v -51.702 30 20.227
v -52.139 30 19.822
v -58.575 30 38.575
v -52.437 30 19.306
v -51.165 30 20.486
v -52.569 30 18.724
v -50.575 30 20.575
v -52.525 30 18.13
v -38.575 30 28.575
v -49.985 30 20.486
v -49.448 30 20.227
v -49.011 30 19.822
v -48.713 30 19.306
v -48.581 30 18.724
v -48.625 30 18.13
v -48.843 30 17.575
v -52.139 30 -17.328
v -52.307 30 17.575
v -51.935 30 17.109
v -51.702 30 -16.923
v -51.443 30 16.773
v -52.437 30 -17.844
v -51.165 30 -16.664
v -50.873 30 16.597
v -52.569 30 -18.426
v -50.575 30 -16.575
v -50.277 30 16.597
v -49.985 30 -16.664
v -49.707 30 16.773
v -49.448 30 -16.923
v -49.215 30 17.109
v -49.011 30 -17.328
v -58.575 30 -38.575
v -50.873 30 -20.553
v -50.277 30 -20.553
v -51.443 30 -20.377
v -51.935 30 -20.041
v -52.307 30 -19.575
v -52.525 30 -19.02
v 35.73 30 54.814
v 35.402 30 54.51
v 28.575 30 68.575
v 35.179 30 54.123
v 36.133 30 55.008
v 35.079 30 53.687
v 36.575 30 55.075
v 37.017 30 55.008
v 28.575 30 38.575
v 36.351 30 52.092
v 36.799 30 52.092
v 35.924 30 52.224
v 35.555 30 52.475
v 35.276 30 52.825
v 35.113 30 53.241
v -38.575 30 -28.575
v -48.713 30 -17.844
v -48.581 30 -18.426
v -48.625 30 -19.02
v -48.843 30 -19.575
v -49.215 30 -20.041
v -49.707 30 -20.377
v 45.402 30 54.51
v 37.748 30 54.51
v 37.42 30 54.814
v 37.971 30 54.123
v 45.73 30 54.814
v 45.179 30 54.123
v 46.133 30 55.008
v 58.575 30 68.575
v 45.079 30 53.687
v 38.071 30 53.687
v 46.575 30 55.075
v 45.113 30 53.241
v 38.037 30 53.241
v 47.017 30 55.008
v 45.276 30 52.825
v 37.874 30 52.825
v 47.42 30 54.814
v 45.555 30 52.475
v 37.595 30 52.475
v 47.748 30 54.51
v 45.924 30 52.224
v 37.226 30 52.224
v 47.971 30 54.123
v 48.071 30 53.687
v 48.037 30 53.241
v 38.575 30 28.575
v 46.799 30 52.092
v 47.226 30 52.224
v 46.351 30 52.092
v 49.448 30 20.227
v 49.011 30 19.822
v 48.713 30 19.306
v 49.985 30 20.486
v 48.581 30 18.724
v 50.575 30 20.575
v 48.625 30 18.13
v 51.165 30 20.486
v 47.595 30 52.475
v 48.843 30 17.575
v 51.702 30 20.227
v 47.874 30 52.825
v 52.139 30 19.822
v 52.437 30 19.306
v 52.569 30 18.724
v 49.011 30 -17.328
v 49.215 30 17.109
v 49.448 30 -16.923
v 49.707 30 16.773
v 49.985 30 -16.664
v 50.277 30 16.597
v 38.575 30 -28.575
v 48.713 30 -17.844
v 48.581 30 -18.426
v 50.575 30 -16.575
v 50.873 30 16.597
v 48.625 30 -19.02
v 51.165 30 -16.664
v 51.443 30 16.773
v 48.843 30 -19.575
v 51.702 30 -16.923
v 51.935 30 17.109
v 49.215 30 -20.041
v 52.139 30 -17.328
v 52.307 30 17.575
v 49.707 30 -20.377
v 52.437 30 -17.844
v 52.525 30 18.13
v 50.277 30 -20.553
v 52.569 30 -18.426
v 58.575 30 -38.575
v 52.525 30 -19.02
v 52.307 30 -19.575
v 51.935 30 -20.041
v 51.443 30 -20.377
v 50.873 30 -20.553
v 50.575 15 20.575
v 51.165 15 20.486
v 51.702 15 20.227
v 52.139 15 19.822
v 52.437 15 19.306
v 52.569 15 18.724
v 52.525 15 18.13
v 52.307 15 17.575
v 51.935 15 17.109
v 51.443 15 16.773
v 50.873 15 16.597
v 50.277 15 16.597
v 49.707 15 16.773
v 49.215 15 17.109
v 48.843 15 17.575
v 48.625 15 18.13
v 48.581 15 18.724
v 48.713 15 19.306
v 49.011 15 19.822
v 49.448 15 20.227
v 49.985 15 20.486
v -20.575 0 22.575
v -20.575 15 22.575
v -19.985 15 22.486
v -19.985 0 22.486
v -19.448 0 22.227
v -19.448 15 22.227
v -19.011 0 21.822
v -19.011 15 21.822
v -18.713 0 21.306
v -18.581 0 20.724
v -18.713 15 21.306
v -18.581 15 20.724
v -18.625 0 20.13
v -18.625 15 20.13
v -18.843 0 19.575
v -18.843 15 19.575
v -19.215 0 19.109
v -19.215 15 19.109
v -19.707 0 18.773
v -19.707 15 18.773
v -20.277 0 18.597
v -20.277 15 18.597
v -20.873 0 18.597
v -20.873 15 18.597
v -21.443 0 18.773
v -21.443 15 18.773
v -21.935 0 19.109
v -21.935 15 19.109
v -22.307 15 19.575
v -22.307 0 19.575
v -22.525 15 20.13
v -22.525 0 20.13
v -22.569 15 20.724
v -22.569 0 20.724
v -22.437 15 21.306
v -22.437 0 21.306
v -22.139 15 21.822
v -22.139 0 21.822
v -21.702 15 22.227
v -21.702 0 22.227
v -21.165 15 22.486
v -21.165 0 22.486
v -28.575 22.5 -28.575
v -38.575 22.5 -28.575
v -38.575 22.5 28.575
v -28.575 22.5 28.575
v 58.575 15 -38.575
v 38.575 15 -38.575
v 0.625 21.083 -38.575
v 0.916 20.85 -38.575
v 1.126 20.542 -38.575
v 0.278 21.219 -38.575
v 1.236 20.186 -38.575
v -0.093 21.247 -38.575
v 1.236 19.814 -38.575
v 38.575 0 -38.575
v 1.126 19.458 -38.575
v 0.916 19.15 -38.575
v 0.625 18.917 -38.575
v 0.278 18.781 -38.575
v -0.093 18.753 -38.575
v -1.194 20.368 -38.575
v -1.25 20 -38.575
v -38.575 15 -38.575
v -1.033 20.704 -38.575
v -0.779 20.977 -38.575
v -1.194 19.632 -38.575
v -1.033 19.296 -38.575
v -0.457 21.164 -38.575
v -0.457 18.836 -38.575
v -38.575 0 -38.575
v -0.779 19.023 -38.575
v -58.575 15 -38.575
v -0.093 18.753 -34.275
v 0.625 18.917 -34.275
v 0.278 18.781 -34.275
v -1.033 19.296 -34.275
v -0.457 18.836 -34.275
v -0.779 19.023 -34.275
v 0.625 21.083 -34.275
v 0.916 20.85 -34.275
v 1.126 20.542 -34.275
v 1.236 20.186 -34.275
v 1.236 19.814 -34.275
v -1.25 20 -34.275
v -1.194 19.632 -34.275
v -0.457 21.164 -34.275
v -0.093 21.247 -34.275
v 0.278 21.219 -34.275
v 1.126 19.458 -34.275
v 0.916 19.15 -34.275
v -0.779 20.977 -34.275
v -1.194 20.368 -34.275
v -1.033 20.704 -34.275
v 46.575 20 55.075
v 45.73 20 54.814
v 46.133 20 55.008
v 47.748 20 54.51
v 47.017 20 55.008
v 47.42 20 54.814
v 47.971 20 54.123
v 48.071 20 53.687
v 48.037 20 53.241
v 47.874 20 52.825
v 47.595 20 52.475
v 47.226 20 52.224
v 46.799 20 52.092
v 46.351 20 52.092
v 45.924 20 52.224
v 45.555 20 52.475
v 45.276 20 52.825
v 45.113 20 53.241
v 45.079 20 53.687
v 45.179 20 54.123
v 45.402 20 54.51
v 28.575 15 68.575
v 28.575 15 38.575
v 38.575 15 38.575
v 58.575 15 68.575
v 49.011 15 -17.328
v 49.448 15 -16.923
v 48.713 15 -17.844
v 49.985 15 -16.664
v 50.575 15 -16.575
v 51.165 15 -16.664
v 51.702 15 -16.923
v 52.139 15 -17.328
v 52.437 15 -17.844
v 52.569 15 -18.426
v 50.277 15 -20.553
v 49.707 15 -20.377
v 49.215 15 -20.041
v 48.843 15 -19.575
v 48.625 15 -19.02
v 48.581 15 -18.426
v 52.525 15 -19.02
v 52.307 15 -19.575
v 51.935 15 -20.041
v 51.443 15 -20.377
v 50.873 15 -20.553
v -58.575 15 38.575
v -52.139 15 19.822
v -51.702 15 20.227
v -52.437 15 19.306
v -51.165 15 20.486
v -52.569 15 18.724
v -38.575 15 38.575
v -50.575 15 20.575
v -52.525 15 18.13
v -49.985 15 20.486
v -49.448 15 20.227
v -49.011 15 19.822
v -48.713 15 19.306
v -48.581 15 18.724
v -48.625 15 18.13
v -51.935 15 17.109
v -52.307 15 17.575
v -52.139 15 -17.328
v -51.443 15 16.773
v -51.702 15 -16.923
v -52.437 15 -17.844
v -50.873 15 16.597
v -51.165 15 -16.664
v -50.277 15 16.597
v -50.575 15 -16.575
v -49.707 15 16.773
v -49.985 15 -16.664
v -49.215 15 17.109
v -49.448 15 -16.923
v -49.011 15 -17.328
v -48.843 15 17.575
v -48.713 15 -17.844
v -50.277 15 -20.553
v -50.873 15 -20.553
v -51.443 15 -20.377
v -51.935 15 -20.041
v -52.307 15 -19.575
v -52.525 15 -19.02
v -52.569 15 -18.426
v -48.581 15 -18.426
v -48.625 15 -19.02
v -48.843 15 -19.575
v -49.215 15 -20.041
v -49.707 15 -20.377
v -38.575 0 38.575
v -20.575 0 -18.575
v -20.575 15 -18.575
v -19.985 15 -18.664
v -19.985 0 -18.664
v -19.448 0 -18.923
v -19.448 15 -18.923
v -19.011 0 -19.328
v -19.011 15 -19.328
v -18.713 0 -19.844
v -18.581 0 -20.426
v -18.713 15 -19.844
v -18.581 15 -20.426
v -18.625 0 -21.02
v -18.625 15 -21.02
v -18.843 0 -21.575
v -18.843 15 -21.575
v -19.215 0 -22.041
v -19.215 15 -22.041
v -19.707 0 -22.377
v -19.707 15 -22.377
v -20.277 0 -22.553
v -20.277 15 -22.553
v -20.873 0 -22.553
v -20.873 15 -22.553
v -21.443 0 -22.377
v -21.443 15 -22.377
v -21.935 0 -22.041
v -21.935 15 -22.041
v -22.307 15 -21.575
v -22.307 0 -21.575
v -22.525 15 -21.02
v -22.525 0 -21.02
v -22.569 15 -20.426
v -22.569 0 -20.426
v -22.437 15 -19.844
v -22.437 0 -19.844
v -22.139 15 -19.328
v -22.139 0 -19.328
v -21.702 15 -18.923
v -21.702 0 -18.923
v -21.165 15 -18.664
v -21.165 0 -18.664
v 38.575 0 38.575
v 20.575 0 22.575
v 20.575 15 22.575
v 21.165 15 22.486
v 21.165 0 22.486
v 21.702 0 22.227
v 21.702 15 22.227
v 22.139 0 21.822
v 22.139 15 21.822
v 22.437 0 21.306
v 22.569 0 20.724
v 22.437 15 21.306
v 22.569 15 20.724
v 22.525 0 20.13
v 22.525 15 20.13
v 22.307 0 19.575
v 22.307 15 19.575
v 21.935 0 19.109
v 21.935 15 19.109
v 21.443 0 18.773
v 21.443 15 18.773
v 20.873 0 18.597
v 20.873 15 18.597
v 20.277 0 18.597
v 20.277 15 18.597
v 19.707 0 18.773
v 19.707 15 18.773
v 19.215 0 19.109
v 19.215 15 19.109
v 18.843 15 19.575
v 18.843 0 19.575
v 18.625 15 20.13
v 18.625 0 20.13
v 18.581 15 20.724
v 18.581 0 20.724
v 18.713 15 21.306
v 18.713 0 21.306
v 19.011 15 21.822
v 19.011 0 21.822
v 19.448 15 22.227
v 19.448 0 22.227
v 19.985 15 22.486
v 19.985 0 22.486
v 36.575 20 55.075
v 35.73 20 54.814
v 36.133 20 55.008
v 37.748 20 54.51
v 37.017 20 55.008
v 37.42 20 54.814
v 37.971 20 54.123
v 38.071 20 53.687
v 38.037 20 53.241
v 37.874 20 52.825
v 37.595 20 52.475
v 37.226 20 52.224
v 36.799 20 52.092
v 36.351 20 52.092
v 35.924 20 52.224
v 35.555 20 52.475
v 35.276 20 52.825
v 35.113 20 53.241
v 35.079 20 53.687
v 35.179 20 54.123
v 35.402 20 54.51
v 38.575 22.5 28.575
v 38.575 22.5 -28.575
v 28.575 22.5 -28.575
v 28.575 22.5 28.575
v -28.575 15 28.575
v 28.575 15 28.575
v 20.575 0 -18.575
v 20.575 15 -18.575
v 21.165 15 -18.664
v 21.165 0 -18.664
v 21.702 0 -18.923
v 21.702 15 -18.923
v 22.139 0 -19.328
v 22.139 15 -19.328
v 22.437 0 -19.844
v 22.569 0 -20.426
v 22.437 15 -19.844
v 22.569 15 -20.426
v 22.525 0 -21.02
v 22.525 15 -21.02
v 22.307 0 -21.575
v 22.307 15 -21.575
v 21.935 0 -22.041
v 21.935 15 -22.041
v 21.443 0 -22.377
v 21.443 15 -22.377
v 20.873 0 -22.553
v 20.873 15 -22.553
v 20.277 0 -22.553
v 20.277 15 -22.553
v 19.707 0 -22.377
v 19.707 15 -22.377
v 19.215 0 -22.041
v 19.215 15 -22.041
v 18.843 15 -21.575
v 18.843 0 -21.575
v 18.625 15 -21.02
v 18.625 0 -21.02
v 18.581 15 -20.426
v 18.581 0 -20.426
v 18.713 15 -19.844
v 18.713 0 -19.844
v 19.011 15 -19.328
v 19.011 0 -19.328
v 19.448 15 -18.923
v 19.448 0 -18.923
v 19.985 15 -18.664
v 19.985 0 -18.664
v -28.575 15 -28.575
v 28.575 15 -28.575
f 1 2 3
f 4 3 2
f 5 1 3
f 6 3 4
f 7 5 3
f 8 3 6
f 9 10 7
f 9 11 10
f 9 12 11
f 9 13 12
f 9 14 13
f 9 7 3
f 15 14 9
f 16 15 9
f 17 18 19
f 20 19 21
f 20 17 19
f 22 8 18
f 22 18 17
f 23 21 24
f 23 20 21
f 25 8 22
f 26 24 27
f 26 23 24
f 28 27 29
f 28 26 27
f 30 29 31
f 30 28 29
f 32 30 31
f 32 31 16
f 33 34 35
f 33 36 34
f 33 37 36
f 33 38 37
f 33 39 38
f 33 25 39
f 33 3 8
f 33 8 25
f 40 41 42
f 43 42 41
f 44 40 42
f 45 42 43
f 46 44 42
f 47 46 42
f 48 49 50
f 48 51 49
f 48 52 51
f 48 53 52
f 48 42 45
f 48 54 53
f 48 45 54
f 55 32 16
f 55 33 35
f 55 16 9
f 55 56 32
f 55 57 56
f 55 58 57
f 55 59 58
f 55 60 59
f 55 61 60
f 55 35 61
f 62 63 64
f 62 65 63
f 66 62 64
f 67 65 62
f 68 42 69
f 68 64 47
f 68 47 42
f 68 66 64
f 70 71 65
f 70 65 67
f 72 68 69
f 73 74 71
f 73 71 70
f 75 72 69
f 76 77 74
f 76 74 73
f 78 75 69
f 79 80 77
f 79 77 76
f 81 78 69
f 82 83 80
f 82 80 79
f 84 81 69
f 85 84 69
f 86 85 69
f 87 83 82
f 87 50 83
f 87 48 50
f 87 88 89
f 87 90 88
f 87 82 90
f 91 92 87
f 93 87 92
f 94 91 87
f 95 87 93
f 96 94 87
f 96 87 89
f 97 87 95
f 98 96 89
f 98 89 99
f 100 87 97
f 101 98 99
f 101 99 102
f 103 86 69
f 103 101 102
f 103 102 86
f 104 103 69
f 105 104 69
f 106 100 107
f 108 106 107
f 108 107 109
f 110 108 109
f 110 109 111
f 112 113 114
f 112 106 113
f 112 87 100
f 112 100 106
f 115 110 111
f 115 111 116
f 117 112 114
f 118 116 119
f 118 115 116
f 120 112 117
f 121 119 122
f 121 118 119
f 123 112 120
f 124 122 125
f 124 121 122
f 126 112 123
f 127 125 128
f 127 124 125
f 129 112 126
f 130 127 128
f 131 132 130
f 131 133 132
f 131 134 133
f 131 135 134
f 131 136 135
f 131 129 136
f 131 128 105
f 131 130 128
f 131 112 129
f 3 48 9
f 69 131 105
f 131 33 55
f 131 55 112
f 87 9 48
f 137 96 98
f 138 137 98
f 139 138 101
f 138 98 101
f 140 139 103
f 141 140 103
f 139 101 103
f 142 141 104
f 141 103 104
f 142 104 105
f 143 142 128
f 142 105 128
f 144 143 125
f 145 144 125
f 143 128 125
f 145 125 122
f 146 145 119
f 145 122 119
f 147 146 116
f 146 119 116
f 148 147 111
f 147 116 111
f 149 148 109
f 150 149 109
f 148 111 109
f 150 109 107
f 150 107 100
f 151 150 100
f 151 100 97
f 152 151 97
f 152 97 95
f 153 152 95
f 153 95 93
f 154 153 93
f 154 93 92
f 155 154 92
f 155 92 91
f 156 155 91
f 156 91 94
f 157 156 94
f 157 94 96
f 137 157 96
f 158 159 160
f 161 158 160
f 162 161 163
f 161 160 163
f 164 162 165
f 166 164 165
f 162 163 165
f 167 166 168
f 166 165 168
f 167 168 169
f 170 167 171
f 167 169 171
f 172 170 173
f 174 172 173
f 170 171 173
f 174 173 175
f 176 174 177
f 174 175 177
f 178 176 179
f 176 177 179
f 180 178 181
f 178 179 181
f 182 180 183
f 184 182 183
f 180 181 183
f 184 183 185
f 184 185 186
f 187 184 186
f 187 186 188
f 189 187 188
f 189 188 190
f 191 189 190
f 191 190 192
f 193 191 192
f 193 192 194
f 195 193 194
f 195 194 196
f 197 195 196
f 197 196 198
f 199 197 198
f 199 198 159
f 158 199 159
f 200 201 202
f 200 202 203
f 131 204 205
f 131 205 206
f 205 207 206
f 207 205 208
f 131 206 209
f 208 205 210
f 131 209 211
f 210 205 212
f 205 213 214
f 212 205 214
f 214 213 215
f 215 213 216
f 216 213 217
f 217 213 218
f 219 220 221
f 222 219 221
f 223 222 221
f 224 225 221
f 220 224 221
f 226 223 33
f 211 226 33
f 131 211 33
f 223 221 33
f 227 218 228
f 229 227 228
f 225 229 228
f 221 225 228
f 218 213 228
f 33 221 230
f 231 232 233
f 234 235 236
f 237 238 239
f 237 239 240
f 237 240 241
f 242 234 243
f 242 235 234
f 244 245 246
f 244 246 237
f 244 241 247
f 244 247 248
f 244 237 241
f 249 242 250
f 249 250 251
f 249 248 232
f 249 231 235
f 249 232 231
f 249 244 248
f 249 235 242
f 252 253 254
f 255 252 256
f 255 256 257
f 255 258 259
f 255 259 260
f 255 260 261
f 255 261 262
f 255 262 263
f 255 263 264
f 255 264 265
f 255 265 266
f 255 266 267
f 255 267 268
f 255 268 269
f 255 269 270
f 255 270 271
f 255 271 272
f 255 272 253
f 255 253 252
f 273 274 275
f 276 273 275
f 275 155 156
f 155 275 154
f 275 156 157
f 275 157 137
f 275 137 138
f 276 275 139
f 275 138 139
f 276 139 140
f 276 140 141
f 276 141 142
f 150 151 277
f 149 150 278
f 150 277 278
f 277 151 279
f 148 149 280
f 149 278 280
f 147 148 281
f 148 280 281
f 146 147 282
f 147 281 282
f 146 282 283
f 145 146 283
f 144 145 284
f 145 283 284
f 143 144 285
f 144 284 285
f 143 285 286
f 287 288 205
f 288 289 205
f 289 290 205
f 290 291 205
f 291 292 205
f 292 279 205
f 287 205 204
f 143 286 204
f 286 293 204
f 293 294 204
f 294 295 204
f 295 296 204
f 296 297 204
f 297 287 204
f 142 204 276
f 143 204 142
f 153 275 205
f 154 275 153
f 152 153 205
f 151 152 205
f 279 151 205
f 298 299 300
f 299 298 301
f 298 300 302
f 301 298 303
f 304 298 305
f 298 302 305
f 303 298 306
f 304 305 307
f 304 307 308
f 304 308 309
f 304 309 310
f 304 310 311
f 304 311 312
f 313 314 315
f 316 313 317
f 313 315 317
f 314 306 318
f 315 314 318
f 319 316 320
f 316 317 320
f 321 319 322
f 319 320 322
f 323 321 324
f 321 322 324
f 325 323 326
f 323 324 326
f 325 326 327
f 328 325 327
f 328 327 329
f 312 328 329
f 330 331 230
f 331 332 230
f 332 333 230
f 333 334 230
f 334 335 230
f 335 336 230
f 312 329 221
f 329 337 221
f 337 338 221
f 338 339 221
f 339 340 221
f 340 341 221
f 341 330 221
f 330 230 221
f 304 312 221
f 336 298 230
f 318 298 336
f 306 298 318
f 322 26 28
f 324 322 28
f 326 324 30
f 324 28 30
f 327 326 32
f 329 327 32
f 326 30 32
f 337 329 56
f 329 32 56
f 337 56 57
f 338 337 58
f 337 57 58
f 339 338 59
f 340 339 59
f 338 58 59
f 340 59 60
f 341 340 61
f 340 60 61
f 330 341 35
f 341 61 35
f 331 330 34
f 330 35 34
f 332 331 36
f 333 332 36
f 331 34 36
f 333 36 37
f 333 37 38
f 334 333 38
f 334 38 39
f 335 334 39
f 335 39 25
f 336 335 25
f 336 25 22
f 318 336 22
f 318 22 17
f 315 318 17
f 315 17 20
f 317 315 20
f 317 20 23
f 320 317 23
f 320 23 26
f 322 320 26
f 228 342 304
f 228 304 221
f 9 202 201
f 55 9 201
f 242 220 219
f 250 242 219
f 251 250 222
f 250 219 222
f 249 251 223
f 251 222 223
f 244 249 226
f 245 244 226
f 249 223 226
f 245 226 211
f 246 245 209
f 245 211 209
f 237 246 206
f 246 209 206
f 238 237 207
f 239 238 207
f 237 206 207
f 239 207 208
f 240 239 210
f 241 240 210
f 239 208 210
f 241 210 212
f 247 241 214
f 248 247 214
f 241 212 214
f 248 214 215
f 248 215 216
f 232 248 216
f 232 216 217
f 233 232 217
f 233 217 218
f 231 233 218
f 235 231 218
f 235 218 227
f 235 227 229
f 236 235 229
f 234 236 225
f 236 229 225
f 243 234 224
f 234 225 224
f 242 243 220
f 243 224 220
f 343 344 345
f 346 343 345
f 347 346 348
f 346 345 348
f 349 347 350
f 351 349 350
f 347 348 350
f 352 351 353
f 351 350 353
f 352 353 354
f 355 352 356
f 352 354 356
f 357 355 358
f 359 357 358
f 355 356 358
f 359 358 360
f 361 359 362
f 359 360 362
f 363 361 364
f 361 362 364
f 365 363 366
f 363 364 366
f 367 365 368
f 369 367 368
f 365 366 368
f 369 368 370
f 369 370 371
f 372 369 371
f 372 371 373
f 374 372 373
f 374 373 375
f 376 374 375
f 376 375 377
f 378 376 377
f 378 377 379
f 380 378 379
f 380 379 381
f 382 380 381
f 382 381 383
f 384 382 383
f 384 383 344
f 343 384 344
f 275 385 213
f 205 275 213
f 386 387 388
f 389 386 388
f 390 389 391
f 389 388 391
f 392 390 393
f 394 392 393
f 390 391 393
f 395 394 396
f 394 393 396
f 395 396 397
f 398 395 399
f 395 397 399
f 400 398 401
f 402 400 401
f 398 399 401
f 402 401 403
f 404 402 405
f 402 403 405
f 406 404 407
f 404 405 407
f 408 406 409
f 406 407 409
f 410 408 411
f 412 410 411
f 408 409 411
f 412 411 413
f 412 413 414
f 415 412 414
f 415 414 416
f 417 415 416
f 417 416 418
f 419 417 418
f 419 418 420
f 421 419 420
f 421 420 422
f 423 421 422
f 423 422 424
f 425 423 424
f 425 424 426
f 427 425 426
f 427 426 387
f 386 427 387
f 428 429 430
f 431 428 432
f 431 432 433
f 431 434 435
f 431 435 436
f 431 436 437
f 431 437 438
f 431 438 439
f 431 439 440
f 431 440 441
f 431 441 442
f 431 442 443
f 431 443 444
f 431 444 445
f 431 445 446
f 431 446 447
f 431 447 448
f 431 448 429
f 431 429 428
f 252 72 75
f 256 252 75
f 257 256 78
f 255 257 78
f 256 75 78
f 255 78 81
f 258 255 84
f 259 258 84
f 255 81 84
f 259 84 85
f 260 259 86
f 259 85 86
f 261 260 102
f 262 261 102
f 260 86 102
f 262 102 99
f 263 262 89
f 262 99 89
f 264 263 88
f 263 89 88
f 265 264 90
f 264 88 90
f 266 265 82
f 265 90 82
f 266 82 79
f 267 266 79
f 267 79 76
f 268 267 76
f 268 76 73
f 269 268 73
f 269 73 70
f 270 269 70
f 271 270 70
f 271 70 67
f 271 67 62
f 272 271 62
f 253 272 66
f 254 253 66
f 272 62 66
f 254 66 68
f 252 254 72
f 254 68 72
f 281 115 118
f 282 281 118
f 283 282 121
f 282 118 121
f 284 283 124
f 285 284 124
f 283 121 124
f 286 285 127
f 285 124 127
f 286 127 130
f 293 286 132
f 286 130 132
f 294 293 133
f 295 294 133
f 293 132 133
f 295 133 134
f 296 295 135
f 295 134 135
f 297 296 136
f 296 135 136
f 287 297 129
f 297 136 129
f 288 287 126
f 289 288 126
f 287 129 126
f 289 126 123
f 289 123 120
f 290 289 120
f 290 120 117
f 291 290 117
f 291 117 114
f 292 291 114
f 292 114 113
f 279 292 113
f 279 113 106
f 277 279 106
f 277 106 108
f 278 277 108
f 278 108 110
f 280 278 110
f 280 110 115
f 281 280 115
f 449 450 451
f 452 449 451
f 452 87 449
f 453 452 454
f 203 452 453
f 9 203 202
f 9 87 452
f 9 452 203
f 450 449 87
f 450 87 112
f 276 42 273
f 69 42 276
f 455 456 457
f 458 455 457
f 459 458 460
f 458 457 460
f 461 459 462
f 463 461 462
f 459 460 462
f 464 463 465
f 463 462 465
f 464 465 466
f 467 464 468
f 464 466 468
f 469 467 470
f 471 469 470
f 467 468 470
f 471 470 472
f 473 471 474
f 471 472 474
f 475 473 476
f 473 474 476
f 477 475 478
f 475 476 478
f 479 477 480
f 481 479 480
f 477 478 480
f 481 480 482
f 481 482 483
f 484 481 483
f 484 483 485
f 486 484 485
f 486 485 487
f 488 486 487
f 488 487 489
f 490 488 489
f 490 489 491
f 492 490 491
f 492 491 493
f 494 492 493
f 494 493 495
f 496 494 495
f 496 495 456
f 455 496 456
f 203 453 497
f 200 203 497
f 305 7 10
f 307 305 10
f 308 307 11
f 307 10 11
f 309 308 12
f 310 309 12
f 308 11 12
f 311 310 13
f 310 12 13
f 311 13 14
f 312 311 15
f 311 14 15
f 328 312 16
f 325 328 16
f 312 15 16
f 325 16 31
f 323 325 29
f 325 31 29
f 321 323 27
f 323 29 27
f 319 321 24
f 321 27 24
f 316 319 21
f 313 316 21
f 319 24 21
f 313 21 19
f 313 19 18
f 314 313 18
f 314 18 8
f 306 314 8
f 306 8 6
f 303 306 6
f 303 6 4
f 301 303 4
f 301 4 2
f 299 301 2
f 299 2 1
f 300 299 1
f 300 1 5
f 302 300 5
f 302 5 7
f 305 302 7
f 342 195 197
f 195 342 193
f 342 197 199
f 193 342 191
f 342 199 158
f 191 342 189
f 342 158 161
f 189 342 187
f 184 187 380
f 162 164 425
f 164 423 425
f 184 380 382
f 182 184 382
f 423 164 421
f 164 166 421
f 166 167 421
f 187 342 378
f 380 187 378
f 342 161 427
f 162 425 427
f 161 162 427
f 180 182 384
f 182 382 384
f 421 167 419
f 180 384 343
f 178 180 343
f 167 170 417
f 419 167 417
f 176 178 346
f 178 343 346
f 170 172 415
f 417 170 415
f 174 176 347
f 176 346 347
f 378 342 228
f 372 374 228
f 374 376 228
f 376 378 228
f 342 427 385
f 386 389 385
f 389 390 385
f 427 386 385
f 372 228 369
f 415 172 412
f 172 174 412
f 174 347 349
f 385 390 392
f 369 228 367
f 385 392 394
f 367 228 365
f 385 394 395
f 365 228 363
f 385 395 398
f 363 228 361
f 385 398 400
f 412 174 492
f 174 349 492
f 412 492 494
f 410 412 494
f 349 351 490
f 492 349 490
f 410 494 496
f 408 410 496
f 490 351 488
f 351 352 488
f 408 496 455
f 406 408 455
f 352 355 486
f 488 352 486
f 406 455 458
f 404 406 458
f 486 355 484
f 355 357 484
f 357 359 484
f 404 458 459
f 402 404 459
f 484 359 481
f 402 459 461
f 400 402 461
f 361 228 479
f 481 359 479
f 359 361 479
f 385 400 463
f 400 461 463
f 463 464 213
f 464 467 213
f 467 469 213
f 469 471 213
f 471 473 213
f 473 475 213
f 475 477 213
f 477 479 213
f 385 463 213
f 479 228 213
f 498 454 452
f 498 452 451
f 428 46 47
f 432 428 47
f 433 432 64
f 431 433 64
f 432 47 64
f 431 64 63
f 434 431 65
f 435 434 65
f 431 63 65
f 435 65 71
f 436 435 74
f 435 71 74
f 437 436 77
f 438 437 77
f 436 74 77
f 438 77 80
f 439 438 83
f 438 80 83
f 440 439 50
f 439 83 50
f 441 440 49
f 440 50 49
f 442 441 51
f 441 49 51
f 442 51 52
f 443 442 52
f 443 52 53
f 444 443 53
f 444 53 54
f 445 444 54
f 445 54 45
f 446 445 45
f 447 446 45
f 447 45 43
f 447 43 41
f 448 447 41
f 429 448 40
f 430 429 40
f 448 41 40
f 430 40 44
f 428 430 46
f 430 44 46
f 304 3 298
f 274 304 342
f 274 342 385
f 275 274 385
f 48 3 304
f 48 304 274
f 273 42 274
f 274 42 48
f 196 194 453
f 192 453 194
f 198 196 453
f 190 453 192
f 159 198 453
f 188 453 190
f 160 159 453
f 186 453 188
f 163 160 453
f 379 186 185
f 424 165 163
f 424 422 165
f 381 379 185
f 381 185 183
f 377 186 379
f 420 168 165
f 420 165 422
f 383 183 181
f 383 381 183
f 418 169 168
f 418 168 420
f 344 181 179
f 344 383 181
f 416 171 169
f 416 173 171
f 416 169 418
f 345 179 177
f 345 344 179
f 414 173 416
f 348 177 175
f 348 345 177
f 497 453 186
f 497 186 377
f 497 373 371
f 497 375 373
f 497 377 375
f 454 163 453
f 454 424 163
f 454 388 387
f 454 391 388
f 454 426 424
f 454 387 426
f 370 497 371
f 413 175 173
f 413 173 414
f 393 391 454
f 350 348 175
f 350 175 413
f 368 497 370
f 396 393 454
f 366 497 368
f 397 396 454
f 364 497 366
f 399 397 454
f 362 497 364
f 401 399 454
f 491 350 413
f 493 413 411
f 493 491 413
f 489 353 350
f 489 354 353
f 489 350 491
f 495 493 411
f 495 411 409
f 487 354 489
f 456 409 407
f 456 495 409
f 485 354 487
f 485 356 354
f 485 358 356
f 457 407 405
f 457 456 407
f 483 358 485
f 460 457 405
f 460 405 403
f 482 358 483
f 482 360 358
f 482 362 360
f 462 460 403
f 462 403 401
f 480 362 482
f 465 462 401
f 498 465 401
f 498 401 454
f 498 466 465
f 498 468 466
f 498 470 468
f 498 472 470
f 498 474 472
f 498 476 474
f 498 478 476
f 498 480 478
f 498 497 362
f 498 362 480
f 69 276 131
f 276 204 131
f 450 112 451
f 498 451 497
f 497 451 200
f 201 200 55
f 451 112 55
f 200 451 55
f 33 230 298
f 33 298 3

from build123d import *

# Parameters (mm, degrees)
CROQUIS1_W              = 77.15
CROQUIS1_H              = 77.15
SALIENTE_EXTRUIR1_DEPTH = 15
CROQUIS4_W              = 10
CROQUIS4_H              = 77.15
SALIENTE_EXTRUIR2_DEPTH = 7.5
CROQUIS4_3_W            = 20
CROQUIS4_3_H            = 77.15
SALIENTE_EXTRUIR3_DEPTH = 15
SALIENTE_EXTRUIR4_DEPTH = 10
CROQUIS7_R              = 2
CORTAR_EXTRUIR2_DEPTH   = 50
CROQUIS8_R              = 2
CORTAR_EXTRUIR3_DEPTH   = 40
CROQUIS9_W              = 117.15
CROQUIS9_H              = 15
SALIENTE_EXTRUIR5_DEPTH = 30
CROQUIS10_W             = 87.15
CROQUIS10_H             = 30
CORTAR_EXTRUIR4_DEPTH   = 40
CROQUIS11_R             = 1.5
CORTAR_EXTRUIR5_DEPTH   = 10
CROQUIS12_R             = 1.25
CORTAR_EXTRUIR6_DEPTH   = 4.3


with BuildPart() as part:
    # Croquis1 → Saliente-Extruir1 (new body)
    with BuildSketch(Plane(origin=(0, 0, 0), x_dir=(1, 0, 0), z_dir=(0, 1, 0))):
        Rectangle(CROQUIS1_W, CROQUIS1_H)
    extrude(amount=SALIENTE_EXTRUIR1_DEPTH)

    # Croquis4 → Saliente-Extruir2 (add)
    with BuildSketch(Plane(origin=(0, 15, 0), x_dir=(1, 0, 0), z_dir=(0, 1, 0))):
        with Locations((-33.575, 0)):
            Rectangle(CROQUIS4_W, CROQUIS4_H)
    saliente_extruir2 = extrude(amount=SALIENTE_EXTRUIR2_DEPTH)

    # Croquis4<3> → Saliente-Extruir3 (add)
    with BuildSketch(Plane(origin=(0, 15, 0), x_dir=(1, 0, 0), z_dir=(0, 1, 0))):
        with Locations((-48.575, 0)):
            Rectangle(CROQUIS4_3_W, CROQUIS4_3_H)
    saliente_extruir3 = extrude(amount=SALIENTE_EXTRUIR3_DEPTH)

    # Simetría1: Saliente-Extruir2, Saliente-Extruir3 across plane
    add(saliente_extruir2.mirror(Plane.ZY))
    add(saliente_extruir3.mirror(Plane.ZY))

    # Croquis5 → Saliente-Extruir4 (add)
    with BuildSketch(Plane.XY.offset(38.575)):
        Polygon((-58.575, 30), (-38.575, 30), (38.575, 30), (58.575, 30), (58.575, 15), (38.575, 15), (38.575, 0), (-38.575, 0), (-38.575, 15), (-58.575, 15), align=None)
    saliente_extruir4 = extrude(amount=-SALIENTE_EXTRUIR4_DEPTH)

    # Croquis7 → Cortar-Extruir2 (cut)
    with BuildSketch(Plane(origin=(0, 15, 0), x_dir=(1, 0, 0), z_dir=(0, 1, 0))):
        with Locations((20.575, 20.575)):
            Circle(CROQUIS7_R)
        with Locations((-20.575, 20.575)):
            Circle(CROQUIS7_R)
        with Locations((20.575, -20.575)):
            Circle(CROQUIS7_R)
        with Locations((-20.575, -20.575)):
            Circle(CROQUIS7_R)
    extrude(amount=-CORTAR_EXTRUIR2_DEPTH, mode=Mode.SUBTRACT)

    # Croquis8 → Cortar-Extruir3 (cut)
    with BuildSketch(Plane(origin=(0, 30, 0), x_dir=(1, 0, 0), z_dir=(0, 1, 0))):
        with Locations((50.575, 18.575)):
            Circle(CROQUIS8_R)
        with Locations((50.575, -18.575)):
            Circle(CROQUIS8_R)
        with Locations((-50.575, 18.575)):
            Circle(CROQUIS8_R)
        with Locations((-50.575, -18.575)):
            Circle(CROQUIS8_R)
    extrude(amount=-CORTAR_EXTRUIR3_DEPTH, mode=Mode.SUBTRACT)

    # Simetría2: Saliente-Extruir4 across plane
    add(saliente_extruir4.mirror(Plane(origin=(0, 0, 0), x_dir=(1, 0, 0), z_dir=(0, 0, -1))))

    # Croquis9 → Saliente-Extruir5 (add)
    with BuildSketch(Plane.XY.offset(38.575)):
        with Locations((0, 22.5)):
            Rectangle(CROQUIS9_W, CROQUIS9_H)
    extrude(amount=SALIENTE_EXTRUIR5_DEPTH)

    # Croquis10 → Cortar-Extruir4 (cut)
    with BuildSketch(Plane(origin=(0, 30, 0), x_dir=(1, 0, 0), z_dir=(0, 1, 0))):
        with Locations((-15, -53.575)):
            Rectangle(CROQUIS10_W, CROQUIS10_H)
    extrude(amount=-CORTAR_EXTRUIR4_DEPTH, mode=Mode.SUBTRACT)

    # Croquis11 → Cortar-Extruir5 (cut)
    with BuildSketch(Plane(origin=(0, 30, 0), x_dir=(1, 0, 0), z_dir=(0, 1, 0))):
        with Locations((36.575, -53.575)):
            Circle(CROQUIS11_R)
        with Locations((46.575, -53.575)):
            Circle(CROQUIS11_R)
    extrude(amount=-CORTAR_EXTRUIR5_DEPTH, mode=Mode.SUBTRACT)

    # Croquis12 → Cortar-Extruir6 (cut)
    with BuildSketch(Plane(origin=(0, 0, -38.575), x_dir=(-1, 0, 0), z_dir=(0, 0, -1))):
        with Locations((0, 20)):
            Circle(CROQUIS12_R)
    extrude(amount=-CORTAR_EXTRUIR6_DEPTH, mode=Mode.SUBTRACT)


solid = part.part
